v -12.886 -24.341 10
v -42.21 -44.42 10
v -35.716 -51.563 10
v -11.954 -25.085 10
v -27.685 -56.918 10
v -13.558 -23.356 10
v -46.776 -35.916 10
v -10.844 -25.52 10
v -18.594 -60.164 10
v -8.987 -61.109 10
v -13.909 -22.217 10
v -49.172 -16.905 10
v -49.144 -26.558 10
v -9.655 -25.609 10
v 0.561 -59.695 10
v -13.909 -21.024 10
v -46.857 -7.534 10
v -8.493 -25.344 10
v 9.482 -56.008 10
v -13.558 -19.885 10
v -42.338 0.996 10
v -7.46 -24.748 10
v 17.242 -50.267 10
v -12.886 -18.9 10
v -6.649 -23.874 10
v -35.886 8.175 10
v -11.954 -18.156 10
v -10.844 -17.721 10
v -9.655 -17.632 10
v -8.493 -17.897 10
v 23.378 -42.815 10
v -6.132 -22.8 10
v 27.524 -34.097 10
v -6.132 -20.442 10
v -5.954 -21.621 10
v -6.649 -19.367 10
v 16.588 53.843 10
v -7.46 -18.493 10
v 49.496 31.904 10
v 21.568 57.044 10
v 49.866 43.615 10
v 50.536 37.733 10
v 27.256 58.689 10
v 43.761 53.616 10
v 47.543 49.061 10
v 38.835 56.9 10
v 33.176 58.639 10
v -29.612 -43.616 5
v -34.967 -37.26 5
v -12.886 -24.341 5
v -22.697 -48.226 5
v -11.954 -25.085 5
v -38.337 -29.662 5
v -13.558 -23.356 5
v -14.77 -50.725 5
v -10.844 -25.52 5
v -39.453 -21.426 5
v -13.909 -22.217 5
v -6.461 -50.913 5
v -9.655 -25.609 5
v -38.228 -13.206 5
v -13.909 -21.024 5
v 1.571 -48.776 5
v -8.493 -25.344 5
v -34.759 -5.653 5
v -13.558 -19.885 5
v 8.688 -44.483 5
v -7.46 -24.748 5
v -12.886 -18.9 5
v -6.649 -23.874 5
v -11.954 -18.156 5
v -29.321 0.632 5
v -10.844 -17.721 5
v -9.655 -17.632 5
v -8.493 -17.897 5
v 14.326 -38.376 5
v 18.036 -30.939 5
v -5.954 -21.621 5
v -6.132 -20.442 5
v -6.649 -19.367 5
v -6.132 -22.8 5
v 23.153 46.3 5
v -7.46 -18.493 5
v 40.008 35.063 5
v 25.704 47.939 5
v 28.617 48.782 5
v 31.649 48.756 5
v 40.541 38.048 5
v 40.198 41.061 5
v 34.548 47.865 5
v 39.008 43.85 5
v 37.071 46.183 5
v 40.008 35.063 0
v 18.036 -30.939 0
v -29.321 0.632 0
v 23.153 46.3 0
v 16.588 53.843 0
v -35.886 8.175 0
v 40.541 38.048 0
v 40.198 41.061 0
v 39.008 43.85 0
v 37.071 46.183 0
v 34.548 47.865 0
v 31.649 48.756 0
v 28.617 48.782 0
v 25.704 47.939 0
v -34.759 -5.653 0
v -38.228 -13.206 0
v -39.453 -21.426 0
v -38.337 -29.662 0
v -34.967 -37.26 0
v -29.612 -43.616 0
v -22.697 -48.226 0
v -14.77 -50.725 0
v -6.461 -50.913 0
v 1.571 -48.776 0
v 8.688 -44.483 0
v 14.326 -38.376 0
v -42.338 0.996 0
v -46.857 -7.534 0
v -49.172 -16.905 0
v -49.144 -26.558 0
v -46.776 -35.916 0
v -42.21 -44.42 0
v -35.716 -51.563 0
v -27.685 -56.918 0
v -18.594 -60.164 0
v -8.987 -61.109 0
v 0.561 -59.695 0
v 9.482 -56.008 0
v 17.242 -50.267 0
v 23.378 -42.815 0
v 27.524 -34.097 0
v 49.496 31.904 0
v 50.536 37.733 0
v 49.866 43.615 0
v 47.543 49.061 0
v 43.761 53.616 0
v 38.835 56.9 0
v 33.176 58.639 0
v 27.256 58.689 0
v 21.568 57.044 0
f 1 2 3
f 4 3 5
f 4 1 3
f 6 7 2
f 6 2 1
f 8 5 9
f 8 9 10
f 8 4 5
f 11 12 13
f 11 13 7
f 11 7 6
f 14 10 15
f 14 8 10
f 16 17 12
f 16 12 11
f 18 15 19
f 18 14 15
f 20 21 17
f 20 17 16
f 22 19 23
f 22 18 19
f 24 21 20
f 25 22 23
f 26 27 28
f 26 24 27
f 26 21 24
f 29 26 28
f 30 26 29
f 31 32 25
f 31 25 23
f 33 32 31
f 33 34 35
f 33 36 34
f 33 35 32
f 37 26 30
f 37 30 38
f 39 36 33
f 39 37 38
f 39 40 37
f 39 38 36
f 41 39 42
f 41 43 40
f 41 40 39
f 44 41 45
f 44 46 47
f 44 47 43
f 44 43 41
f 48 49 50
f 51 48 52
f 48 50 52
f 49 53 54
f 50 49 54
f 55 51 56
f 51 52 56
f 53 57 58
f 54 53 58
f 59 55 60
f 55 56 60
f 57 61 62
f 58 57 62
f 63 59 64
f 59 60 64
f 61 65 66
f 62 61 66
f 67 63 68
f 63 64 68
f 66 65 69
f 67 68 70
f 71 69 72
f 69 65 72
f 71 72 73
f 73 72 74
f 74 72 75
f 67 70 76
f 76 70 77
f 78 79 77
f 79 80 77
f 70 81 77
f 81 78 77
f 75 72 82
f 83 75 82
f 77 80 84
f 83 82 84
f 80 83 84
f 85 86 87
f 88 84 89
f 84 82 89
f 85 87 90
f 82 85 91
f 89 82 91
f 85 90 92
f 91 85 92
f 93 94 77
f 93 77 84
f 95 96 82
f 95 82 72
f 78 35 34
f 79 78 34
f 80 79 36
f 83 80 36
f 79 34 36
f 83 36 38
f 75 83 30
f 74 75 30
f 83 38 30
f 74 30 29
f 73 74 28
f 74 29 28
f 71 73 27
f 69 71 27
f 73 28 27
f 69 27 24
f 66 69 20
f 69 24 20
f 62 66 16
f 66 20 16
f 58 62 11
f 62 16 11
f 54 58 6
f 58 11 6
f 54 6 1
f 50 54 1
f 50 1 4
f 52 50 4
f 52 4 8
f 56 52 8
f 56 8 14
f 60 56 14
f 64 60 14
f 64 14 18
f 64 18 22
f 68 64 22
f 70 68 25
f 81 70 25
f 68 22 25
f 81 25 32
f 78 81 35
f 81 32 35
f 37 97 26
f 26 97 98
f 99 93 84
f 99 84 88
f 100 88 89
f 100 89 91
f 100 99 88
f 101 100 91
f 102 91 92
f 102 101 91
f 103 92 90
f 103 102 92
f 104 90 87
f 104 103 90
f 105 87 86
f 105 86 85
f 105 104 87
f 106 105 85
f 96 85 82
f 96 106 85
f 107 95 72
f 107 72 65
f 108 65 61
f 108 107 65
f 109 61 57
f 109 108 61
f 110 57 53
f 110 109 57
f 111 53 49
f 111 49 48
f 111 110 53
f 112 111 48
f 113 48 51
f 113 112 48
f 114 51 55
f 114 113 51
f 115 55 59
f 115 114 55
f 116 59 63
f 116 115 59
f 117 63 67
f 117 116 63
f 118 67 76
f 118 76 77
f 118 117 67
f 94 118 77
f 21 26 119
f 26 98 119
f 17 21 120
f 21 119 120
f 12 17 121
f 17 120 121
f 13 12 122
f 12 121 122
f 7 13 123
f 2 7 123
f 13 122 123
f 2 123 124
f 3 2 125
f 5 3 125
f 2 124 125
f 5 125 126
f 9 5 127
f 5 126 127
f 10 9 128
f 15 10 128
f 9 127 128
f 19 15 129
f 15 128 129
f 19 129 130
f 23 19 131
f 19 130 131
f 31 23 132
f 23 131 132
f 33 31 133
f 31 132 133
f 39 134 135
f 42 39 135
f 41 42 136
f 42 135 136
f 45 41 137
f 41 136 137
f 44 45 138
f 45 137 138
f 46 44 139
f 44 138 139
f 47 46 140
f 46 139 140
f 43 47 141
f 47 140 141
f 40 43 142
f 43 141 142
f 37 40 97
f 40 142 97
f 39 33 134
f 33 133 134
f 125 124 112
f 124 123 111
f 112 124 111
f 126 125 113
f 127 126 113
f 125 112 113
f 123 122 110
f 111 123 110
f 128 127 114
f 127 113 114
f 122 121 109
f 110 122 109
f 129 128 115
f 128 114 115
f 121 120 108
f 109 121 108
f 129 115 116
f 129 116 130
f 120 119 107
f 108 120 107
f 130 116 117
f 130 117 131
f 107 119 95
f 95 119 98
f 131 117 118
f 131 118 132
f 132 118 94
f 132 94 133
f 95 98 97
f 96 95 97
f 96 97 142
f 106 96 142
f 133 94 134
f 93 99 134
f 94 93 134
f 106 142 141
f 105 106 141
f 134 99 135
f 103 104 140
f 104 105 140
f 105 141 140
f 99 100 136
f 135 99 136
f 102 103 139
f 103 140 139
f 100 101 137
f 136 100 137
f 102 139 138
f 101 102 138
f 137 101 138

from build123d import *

# Parameters (mm, degrees)
BOSS_EXTRU_1_DEPTH      = 5
BOSS_EXTRU_2_DEPTH      = 5
ESQUISSE3_R             = 4
ENL_V_MAT_EXTRU_1_DEPTH = 5


with BuildPart() as part:
    # Esquisse1 → Boss.-Extru.1 (new body)
    with BuildSketch(Plane.XY):
        with BuildLine():
            Line((16.587839799, 53.843180126), (-35.88556985, 8.175453138))
            ThreePointArc((-35.88556985, 8.175453138), (-31.864665417, -54.486574909), (27.523708309, -34.097398918))
            Line((27.523708309, -34.097398918), (49.496452515, 31.904105008))
            ThreePointArc((49.496452515, 31.904105008), (41.417346329, 55.43644284), (16.587839799, 53.843180126))
        make_face()
        with BuildLine():
            Line((23.152792246, 46.299878504), (-29.320617403, 0.632151516))
            ThreePointArc((-29.320617403, 0.632151516), (-26.31766346, -46.166071962), (18.035678944, -30.938712678))
            Line((18.035678944, -30.938712678), (40.008423149, 35.062791248))
            ThreePointArc((40.008423149, 35.062791248), (35.870344371, 47.115939894), (23.152792246, 46.299878504))
        make_face(mode=Mode.SUBTRACT)
    extrude(amount=BOSS_EXTRU_1_DEPTH)

    # Esquisse2 → Boss.-Extru.2 (add)
    with BuildSketch(Plane.XY.offset(5)):
        with BuildLine():
            Line((16.587839799, 53.843180126), (-35.88556985, 8.175453138))
            ThreePointArc((-35.88556985, 8.175453138), (-31.864665417, -54.486574909), (27.523708309, -34.097398918))
            Line((27.523708309, -34.097398918), (49.496452515, 31.904105008))
            ThreePointArc((49.496452515, 31.904105008), (41.417346329, 55.43644284), (16.587839799, 53.843180126))
        make_face()
    extrude(amount=BOSS_EXTRU_2_DEPTH)

    # Esquisse3 → Enlèv. mat.-Extru.1 (cut)
    with BuildSketch(Plane.XY.offset(10)):
        with Locations((-9.954007684, -21.62058827)):
            Circle(ESQUISSE3_R)
    extrude(amount=-ENL_V_MAT_EXTRU_1_DEPTH, mode=Mode.SUBTRACT)


solid = part.part
